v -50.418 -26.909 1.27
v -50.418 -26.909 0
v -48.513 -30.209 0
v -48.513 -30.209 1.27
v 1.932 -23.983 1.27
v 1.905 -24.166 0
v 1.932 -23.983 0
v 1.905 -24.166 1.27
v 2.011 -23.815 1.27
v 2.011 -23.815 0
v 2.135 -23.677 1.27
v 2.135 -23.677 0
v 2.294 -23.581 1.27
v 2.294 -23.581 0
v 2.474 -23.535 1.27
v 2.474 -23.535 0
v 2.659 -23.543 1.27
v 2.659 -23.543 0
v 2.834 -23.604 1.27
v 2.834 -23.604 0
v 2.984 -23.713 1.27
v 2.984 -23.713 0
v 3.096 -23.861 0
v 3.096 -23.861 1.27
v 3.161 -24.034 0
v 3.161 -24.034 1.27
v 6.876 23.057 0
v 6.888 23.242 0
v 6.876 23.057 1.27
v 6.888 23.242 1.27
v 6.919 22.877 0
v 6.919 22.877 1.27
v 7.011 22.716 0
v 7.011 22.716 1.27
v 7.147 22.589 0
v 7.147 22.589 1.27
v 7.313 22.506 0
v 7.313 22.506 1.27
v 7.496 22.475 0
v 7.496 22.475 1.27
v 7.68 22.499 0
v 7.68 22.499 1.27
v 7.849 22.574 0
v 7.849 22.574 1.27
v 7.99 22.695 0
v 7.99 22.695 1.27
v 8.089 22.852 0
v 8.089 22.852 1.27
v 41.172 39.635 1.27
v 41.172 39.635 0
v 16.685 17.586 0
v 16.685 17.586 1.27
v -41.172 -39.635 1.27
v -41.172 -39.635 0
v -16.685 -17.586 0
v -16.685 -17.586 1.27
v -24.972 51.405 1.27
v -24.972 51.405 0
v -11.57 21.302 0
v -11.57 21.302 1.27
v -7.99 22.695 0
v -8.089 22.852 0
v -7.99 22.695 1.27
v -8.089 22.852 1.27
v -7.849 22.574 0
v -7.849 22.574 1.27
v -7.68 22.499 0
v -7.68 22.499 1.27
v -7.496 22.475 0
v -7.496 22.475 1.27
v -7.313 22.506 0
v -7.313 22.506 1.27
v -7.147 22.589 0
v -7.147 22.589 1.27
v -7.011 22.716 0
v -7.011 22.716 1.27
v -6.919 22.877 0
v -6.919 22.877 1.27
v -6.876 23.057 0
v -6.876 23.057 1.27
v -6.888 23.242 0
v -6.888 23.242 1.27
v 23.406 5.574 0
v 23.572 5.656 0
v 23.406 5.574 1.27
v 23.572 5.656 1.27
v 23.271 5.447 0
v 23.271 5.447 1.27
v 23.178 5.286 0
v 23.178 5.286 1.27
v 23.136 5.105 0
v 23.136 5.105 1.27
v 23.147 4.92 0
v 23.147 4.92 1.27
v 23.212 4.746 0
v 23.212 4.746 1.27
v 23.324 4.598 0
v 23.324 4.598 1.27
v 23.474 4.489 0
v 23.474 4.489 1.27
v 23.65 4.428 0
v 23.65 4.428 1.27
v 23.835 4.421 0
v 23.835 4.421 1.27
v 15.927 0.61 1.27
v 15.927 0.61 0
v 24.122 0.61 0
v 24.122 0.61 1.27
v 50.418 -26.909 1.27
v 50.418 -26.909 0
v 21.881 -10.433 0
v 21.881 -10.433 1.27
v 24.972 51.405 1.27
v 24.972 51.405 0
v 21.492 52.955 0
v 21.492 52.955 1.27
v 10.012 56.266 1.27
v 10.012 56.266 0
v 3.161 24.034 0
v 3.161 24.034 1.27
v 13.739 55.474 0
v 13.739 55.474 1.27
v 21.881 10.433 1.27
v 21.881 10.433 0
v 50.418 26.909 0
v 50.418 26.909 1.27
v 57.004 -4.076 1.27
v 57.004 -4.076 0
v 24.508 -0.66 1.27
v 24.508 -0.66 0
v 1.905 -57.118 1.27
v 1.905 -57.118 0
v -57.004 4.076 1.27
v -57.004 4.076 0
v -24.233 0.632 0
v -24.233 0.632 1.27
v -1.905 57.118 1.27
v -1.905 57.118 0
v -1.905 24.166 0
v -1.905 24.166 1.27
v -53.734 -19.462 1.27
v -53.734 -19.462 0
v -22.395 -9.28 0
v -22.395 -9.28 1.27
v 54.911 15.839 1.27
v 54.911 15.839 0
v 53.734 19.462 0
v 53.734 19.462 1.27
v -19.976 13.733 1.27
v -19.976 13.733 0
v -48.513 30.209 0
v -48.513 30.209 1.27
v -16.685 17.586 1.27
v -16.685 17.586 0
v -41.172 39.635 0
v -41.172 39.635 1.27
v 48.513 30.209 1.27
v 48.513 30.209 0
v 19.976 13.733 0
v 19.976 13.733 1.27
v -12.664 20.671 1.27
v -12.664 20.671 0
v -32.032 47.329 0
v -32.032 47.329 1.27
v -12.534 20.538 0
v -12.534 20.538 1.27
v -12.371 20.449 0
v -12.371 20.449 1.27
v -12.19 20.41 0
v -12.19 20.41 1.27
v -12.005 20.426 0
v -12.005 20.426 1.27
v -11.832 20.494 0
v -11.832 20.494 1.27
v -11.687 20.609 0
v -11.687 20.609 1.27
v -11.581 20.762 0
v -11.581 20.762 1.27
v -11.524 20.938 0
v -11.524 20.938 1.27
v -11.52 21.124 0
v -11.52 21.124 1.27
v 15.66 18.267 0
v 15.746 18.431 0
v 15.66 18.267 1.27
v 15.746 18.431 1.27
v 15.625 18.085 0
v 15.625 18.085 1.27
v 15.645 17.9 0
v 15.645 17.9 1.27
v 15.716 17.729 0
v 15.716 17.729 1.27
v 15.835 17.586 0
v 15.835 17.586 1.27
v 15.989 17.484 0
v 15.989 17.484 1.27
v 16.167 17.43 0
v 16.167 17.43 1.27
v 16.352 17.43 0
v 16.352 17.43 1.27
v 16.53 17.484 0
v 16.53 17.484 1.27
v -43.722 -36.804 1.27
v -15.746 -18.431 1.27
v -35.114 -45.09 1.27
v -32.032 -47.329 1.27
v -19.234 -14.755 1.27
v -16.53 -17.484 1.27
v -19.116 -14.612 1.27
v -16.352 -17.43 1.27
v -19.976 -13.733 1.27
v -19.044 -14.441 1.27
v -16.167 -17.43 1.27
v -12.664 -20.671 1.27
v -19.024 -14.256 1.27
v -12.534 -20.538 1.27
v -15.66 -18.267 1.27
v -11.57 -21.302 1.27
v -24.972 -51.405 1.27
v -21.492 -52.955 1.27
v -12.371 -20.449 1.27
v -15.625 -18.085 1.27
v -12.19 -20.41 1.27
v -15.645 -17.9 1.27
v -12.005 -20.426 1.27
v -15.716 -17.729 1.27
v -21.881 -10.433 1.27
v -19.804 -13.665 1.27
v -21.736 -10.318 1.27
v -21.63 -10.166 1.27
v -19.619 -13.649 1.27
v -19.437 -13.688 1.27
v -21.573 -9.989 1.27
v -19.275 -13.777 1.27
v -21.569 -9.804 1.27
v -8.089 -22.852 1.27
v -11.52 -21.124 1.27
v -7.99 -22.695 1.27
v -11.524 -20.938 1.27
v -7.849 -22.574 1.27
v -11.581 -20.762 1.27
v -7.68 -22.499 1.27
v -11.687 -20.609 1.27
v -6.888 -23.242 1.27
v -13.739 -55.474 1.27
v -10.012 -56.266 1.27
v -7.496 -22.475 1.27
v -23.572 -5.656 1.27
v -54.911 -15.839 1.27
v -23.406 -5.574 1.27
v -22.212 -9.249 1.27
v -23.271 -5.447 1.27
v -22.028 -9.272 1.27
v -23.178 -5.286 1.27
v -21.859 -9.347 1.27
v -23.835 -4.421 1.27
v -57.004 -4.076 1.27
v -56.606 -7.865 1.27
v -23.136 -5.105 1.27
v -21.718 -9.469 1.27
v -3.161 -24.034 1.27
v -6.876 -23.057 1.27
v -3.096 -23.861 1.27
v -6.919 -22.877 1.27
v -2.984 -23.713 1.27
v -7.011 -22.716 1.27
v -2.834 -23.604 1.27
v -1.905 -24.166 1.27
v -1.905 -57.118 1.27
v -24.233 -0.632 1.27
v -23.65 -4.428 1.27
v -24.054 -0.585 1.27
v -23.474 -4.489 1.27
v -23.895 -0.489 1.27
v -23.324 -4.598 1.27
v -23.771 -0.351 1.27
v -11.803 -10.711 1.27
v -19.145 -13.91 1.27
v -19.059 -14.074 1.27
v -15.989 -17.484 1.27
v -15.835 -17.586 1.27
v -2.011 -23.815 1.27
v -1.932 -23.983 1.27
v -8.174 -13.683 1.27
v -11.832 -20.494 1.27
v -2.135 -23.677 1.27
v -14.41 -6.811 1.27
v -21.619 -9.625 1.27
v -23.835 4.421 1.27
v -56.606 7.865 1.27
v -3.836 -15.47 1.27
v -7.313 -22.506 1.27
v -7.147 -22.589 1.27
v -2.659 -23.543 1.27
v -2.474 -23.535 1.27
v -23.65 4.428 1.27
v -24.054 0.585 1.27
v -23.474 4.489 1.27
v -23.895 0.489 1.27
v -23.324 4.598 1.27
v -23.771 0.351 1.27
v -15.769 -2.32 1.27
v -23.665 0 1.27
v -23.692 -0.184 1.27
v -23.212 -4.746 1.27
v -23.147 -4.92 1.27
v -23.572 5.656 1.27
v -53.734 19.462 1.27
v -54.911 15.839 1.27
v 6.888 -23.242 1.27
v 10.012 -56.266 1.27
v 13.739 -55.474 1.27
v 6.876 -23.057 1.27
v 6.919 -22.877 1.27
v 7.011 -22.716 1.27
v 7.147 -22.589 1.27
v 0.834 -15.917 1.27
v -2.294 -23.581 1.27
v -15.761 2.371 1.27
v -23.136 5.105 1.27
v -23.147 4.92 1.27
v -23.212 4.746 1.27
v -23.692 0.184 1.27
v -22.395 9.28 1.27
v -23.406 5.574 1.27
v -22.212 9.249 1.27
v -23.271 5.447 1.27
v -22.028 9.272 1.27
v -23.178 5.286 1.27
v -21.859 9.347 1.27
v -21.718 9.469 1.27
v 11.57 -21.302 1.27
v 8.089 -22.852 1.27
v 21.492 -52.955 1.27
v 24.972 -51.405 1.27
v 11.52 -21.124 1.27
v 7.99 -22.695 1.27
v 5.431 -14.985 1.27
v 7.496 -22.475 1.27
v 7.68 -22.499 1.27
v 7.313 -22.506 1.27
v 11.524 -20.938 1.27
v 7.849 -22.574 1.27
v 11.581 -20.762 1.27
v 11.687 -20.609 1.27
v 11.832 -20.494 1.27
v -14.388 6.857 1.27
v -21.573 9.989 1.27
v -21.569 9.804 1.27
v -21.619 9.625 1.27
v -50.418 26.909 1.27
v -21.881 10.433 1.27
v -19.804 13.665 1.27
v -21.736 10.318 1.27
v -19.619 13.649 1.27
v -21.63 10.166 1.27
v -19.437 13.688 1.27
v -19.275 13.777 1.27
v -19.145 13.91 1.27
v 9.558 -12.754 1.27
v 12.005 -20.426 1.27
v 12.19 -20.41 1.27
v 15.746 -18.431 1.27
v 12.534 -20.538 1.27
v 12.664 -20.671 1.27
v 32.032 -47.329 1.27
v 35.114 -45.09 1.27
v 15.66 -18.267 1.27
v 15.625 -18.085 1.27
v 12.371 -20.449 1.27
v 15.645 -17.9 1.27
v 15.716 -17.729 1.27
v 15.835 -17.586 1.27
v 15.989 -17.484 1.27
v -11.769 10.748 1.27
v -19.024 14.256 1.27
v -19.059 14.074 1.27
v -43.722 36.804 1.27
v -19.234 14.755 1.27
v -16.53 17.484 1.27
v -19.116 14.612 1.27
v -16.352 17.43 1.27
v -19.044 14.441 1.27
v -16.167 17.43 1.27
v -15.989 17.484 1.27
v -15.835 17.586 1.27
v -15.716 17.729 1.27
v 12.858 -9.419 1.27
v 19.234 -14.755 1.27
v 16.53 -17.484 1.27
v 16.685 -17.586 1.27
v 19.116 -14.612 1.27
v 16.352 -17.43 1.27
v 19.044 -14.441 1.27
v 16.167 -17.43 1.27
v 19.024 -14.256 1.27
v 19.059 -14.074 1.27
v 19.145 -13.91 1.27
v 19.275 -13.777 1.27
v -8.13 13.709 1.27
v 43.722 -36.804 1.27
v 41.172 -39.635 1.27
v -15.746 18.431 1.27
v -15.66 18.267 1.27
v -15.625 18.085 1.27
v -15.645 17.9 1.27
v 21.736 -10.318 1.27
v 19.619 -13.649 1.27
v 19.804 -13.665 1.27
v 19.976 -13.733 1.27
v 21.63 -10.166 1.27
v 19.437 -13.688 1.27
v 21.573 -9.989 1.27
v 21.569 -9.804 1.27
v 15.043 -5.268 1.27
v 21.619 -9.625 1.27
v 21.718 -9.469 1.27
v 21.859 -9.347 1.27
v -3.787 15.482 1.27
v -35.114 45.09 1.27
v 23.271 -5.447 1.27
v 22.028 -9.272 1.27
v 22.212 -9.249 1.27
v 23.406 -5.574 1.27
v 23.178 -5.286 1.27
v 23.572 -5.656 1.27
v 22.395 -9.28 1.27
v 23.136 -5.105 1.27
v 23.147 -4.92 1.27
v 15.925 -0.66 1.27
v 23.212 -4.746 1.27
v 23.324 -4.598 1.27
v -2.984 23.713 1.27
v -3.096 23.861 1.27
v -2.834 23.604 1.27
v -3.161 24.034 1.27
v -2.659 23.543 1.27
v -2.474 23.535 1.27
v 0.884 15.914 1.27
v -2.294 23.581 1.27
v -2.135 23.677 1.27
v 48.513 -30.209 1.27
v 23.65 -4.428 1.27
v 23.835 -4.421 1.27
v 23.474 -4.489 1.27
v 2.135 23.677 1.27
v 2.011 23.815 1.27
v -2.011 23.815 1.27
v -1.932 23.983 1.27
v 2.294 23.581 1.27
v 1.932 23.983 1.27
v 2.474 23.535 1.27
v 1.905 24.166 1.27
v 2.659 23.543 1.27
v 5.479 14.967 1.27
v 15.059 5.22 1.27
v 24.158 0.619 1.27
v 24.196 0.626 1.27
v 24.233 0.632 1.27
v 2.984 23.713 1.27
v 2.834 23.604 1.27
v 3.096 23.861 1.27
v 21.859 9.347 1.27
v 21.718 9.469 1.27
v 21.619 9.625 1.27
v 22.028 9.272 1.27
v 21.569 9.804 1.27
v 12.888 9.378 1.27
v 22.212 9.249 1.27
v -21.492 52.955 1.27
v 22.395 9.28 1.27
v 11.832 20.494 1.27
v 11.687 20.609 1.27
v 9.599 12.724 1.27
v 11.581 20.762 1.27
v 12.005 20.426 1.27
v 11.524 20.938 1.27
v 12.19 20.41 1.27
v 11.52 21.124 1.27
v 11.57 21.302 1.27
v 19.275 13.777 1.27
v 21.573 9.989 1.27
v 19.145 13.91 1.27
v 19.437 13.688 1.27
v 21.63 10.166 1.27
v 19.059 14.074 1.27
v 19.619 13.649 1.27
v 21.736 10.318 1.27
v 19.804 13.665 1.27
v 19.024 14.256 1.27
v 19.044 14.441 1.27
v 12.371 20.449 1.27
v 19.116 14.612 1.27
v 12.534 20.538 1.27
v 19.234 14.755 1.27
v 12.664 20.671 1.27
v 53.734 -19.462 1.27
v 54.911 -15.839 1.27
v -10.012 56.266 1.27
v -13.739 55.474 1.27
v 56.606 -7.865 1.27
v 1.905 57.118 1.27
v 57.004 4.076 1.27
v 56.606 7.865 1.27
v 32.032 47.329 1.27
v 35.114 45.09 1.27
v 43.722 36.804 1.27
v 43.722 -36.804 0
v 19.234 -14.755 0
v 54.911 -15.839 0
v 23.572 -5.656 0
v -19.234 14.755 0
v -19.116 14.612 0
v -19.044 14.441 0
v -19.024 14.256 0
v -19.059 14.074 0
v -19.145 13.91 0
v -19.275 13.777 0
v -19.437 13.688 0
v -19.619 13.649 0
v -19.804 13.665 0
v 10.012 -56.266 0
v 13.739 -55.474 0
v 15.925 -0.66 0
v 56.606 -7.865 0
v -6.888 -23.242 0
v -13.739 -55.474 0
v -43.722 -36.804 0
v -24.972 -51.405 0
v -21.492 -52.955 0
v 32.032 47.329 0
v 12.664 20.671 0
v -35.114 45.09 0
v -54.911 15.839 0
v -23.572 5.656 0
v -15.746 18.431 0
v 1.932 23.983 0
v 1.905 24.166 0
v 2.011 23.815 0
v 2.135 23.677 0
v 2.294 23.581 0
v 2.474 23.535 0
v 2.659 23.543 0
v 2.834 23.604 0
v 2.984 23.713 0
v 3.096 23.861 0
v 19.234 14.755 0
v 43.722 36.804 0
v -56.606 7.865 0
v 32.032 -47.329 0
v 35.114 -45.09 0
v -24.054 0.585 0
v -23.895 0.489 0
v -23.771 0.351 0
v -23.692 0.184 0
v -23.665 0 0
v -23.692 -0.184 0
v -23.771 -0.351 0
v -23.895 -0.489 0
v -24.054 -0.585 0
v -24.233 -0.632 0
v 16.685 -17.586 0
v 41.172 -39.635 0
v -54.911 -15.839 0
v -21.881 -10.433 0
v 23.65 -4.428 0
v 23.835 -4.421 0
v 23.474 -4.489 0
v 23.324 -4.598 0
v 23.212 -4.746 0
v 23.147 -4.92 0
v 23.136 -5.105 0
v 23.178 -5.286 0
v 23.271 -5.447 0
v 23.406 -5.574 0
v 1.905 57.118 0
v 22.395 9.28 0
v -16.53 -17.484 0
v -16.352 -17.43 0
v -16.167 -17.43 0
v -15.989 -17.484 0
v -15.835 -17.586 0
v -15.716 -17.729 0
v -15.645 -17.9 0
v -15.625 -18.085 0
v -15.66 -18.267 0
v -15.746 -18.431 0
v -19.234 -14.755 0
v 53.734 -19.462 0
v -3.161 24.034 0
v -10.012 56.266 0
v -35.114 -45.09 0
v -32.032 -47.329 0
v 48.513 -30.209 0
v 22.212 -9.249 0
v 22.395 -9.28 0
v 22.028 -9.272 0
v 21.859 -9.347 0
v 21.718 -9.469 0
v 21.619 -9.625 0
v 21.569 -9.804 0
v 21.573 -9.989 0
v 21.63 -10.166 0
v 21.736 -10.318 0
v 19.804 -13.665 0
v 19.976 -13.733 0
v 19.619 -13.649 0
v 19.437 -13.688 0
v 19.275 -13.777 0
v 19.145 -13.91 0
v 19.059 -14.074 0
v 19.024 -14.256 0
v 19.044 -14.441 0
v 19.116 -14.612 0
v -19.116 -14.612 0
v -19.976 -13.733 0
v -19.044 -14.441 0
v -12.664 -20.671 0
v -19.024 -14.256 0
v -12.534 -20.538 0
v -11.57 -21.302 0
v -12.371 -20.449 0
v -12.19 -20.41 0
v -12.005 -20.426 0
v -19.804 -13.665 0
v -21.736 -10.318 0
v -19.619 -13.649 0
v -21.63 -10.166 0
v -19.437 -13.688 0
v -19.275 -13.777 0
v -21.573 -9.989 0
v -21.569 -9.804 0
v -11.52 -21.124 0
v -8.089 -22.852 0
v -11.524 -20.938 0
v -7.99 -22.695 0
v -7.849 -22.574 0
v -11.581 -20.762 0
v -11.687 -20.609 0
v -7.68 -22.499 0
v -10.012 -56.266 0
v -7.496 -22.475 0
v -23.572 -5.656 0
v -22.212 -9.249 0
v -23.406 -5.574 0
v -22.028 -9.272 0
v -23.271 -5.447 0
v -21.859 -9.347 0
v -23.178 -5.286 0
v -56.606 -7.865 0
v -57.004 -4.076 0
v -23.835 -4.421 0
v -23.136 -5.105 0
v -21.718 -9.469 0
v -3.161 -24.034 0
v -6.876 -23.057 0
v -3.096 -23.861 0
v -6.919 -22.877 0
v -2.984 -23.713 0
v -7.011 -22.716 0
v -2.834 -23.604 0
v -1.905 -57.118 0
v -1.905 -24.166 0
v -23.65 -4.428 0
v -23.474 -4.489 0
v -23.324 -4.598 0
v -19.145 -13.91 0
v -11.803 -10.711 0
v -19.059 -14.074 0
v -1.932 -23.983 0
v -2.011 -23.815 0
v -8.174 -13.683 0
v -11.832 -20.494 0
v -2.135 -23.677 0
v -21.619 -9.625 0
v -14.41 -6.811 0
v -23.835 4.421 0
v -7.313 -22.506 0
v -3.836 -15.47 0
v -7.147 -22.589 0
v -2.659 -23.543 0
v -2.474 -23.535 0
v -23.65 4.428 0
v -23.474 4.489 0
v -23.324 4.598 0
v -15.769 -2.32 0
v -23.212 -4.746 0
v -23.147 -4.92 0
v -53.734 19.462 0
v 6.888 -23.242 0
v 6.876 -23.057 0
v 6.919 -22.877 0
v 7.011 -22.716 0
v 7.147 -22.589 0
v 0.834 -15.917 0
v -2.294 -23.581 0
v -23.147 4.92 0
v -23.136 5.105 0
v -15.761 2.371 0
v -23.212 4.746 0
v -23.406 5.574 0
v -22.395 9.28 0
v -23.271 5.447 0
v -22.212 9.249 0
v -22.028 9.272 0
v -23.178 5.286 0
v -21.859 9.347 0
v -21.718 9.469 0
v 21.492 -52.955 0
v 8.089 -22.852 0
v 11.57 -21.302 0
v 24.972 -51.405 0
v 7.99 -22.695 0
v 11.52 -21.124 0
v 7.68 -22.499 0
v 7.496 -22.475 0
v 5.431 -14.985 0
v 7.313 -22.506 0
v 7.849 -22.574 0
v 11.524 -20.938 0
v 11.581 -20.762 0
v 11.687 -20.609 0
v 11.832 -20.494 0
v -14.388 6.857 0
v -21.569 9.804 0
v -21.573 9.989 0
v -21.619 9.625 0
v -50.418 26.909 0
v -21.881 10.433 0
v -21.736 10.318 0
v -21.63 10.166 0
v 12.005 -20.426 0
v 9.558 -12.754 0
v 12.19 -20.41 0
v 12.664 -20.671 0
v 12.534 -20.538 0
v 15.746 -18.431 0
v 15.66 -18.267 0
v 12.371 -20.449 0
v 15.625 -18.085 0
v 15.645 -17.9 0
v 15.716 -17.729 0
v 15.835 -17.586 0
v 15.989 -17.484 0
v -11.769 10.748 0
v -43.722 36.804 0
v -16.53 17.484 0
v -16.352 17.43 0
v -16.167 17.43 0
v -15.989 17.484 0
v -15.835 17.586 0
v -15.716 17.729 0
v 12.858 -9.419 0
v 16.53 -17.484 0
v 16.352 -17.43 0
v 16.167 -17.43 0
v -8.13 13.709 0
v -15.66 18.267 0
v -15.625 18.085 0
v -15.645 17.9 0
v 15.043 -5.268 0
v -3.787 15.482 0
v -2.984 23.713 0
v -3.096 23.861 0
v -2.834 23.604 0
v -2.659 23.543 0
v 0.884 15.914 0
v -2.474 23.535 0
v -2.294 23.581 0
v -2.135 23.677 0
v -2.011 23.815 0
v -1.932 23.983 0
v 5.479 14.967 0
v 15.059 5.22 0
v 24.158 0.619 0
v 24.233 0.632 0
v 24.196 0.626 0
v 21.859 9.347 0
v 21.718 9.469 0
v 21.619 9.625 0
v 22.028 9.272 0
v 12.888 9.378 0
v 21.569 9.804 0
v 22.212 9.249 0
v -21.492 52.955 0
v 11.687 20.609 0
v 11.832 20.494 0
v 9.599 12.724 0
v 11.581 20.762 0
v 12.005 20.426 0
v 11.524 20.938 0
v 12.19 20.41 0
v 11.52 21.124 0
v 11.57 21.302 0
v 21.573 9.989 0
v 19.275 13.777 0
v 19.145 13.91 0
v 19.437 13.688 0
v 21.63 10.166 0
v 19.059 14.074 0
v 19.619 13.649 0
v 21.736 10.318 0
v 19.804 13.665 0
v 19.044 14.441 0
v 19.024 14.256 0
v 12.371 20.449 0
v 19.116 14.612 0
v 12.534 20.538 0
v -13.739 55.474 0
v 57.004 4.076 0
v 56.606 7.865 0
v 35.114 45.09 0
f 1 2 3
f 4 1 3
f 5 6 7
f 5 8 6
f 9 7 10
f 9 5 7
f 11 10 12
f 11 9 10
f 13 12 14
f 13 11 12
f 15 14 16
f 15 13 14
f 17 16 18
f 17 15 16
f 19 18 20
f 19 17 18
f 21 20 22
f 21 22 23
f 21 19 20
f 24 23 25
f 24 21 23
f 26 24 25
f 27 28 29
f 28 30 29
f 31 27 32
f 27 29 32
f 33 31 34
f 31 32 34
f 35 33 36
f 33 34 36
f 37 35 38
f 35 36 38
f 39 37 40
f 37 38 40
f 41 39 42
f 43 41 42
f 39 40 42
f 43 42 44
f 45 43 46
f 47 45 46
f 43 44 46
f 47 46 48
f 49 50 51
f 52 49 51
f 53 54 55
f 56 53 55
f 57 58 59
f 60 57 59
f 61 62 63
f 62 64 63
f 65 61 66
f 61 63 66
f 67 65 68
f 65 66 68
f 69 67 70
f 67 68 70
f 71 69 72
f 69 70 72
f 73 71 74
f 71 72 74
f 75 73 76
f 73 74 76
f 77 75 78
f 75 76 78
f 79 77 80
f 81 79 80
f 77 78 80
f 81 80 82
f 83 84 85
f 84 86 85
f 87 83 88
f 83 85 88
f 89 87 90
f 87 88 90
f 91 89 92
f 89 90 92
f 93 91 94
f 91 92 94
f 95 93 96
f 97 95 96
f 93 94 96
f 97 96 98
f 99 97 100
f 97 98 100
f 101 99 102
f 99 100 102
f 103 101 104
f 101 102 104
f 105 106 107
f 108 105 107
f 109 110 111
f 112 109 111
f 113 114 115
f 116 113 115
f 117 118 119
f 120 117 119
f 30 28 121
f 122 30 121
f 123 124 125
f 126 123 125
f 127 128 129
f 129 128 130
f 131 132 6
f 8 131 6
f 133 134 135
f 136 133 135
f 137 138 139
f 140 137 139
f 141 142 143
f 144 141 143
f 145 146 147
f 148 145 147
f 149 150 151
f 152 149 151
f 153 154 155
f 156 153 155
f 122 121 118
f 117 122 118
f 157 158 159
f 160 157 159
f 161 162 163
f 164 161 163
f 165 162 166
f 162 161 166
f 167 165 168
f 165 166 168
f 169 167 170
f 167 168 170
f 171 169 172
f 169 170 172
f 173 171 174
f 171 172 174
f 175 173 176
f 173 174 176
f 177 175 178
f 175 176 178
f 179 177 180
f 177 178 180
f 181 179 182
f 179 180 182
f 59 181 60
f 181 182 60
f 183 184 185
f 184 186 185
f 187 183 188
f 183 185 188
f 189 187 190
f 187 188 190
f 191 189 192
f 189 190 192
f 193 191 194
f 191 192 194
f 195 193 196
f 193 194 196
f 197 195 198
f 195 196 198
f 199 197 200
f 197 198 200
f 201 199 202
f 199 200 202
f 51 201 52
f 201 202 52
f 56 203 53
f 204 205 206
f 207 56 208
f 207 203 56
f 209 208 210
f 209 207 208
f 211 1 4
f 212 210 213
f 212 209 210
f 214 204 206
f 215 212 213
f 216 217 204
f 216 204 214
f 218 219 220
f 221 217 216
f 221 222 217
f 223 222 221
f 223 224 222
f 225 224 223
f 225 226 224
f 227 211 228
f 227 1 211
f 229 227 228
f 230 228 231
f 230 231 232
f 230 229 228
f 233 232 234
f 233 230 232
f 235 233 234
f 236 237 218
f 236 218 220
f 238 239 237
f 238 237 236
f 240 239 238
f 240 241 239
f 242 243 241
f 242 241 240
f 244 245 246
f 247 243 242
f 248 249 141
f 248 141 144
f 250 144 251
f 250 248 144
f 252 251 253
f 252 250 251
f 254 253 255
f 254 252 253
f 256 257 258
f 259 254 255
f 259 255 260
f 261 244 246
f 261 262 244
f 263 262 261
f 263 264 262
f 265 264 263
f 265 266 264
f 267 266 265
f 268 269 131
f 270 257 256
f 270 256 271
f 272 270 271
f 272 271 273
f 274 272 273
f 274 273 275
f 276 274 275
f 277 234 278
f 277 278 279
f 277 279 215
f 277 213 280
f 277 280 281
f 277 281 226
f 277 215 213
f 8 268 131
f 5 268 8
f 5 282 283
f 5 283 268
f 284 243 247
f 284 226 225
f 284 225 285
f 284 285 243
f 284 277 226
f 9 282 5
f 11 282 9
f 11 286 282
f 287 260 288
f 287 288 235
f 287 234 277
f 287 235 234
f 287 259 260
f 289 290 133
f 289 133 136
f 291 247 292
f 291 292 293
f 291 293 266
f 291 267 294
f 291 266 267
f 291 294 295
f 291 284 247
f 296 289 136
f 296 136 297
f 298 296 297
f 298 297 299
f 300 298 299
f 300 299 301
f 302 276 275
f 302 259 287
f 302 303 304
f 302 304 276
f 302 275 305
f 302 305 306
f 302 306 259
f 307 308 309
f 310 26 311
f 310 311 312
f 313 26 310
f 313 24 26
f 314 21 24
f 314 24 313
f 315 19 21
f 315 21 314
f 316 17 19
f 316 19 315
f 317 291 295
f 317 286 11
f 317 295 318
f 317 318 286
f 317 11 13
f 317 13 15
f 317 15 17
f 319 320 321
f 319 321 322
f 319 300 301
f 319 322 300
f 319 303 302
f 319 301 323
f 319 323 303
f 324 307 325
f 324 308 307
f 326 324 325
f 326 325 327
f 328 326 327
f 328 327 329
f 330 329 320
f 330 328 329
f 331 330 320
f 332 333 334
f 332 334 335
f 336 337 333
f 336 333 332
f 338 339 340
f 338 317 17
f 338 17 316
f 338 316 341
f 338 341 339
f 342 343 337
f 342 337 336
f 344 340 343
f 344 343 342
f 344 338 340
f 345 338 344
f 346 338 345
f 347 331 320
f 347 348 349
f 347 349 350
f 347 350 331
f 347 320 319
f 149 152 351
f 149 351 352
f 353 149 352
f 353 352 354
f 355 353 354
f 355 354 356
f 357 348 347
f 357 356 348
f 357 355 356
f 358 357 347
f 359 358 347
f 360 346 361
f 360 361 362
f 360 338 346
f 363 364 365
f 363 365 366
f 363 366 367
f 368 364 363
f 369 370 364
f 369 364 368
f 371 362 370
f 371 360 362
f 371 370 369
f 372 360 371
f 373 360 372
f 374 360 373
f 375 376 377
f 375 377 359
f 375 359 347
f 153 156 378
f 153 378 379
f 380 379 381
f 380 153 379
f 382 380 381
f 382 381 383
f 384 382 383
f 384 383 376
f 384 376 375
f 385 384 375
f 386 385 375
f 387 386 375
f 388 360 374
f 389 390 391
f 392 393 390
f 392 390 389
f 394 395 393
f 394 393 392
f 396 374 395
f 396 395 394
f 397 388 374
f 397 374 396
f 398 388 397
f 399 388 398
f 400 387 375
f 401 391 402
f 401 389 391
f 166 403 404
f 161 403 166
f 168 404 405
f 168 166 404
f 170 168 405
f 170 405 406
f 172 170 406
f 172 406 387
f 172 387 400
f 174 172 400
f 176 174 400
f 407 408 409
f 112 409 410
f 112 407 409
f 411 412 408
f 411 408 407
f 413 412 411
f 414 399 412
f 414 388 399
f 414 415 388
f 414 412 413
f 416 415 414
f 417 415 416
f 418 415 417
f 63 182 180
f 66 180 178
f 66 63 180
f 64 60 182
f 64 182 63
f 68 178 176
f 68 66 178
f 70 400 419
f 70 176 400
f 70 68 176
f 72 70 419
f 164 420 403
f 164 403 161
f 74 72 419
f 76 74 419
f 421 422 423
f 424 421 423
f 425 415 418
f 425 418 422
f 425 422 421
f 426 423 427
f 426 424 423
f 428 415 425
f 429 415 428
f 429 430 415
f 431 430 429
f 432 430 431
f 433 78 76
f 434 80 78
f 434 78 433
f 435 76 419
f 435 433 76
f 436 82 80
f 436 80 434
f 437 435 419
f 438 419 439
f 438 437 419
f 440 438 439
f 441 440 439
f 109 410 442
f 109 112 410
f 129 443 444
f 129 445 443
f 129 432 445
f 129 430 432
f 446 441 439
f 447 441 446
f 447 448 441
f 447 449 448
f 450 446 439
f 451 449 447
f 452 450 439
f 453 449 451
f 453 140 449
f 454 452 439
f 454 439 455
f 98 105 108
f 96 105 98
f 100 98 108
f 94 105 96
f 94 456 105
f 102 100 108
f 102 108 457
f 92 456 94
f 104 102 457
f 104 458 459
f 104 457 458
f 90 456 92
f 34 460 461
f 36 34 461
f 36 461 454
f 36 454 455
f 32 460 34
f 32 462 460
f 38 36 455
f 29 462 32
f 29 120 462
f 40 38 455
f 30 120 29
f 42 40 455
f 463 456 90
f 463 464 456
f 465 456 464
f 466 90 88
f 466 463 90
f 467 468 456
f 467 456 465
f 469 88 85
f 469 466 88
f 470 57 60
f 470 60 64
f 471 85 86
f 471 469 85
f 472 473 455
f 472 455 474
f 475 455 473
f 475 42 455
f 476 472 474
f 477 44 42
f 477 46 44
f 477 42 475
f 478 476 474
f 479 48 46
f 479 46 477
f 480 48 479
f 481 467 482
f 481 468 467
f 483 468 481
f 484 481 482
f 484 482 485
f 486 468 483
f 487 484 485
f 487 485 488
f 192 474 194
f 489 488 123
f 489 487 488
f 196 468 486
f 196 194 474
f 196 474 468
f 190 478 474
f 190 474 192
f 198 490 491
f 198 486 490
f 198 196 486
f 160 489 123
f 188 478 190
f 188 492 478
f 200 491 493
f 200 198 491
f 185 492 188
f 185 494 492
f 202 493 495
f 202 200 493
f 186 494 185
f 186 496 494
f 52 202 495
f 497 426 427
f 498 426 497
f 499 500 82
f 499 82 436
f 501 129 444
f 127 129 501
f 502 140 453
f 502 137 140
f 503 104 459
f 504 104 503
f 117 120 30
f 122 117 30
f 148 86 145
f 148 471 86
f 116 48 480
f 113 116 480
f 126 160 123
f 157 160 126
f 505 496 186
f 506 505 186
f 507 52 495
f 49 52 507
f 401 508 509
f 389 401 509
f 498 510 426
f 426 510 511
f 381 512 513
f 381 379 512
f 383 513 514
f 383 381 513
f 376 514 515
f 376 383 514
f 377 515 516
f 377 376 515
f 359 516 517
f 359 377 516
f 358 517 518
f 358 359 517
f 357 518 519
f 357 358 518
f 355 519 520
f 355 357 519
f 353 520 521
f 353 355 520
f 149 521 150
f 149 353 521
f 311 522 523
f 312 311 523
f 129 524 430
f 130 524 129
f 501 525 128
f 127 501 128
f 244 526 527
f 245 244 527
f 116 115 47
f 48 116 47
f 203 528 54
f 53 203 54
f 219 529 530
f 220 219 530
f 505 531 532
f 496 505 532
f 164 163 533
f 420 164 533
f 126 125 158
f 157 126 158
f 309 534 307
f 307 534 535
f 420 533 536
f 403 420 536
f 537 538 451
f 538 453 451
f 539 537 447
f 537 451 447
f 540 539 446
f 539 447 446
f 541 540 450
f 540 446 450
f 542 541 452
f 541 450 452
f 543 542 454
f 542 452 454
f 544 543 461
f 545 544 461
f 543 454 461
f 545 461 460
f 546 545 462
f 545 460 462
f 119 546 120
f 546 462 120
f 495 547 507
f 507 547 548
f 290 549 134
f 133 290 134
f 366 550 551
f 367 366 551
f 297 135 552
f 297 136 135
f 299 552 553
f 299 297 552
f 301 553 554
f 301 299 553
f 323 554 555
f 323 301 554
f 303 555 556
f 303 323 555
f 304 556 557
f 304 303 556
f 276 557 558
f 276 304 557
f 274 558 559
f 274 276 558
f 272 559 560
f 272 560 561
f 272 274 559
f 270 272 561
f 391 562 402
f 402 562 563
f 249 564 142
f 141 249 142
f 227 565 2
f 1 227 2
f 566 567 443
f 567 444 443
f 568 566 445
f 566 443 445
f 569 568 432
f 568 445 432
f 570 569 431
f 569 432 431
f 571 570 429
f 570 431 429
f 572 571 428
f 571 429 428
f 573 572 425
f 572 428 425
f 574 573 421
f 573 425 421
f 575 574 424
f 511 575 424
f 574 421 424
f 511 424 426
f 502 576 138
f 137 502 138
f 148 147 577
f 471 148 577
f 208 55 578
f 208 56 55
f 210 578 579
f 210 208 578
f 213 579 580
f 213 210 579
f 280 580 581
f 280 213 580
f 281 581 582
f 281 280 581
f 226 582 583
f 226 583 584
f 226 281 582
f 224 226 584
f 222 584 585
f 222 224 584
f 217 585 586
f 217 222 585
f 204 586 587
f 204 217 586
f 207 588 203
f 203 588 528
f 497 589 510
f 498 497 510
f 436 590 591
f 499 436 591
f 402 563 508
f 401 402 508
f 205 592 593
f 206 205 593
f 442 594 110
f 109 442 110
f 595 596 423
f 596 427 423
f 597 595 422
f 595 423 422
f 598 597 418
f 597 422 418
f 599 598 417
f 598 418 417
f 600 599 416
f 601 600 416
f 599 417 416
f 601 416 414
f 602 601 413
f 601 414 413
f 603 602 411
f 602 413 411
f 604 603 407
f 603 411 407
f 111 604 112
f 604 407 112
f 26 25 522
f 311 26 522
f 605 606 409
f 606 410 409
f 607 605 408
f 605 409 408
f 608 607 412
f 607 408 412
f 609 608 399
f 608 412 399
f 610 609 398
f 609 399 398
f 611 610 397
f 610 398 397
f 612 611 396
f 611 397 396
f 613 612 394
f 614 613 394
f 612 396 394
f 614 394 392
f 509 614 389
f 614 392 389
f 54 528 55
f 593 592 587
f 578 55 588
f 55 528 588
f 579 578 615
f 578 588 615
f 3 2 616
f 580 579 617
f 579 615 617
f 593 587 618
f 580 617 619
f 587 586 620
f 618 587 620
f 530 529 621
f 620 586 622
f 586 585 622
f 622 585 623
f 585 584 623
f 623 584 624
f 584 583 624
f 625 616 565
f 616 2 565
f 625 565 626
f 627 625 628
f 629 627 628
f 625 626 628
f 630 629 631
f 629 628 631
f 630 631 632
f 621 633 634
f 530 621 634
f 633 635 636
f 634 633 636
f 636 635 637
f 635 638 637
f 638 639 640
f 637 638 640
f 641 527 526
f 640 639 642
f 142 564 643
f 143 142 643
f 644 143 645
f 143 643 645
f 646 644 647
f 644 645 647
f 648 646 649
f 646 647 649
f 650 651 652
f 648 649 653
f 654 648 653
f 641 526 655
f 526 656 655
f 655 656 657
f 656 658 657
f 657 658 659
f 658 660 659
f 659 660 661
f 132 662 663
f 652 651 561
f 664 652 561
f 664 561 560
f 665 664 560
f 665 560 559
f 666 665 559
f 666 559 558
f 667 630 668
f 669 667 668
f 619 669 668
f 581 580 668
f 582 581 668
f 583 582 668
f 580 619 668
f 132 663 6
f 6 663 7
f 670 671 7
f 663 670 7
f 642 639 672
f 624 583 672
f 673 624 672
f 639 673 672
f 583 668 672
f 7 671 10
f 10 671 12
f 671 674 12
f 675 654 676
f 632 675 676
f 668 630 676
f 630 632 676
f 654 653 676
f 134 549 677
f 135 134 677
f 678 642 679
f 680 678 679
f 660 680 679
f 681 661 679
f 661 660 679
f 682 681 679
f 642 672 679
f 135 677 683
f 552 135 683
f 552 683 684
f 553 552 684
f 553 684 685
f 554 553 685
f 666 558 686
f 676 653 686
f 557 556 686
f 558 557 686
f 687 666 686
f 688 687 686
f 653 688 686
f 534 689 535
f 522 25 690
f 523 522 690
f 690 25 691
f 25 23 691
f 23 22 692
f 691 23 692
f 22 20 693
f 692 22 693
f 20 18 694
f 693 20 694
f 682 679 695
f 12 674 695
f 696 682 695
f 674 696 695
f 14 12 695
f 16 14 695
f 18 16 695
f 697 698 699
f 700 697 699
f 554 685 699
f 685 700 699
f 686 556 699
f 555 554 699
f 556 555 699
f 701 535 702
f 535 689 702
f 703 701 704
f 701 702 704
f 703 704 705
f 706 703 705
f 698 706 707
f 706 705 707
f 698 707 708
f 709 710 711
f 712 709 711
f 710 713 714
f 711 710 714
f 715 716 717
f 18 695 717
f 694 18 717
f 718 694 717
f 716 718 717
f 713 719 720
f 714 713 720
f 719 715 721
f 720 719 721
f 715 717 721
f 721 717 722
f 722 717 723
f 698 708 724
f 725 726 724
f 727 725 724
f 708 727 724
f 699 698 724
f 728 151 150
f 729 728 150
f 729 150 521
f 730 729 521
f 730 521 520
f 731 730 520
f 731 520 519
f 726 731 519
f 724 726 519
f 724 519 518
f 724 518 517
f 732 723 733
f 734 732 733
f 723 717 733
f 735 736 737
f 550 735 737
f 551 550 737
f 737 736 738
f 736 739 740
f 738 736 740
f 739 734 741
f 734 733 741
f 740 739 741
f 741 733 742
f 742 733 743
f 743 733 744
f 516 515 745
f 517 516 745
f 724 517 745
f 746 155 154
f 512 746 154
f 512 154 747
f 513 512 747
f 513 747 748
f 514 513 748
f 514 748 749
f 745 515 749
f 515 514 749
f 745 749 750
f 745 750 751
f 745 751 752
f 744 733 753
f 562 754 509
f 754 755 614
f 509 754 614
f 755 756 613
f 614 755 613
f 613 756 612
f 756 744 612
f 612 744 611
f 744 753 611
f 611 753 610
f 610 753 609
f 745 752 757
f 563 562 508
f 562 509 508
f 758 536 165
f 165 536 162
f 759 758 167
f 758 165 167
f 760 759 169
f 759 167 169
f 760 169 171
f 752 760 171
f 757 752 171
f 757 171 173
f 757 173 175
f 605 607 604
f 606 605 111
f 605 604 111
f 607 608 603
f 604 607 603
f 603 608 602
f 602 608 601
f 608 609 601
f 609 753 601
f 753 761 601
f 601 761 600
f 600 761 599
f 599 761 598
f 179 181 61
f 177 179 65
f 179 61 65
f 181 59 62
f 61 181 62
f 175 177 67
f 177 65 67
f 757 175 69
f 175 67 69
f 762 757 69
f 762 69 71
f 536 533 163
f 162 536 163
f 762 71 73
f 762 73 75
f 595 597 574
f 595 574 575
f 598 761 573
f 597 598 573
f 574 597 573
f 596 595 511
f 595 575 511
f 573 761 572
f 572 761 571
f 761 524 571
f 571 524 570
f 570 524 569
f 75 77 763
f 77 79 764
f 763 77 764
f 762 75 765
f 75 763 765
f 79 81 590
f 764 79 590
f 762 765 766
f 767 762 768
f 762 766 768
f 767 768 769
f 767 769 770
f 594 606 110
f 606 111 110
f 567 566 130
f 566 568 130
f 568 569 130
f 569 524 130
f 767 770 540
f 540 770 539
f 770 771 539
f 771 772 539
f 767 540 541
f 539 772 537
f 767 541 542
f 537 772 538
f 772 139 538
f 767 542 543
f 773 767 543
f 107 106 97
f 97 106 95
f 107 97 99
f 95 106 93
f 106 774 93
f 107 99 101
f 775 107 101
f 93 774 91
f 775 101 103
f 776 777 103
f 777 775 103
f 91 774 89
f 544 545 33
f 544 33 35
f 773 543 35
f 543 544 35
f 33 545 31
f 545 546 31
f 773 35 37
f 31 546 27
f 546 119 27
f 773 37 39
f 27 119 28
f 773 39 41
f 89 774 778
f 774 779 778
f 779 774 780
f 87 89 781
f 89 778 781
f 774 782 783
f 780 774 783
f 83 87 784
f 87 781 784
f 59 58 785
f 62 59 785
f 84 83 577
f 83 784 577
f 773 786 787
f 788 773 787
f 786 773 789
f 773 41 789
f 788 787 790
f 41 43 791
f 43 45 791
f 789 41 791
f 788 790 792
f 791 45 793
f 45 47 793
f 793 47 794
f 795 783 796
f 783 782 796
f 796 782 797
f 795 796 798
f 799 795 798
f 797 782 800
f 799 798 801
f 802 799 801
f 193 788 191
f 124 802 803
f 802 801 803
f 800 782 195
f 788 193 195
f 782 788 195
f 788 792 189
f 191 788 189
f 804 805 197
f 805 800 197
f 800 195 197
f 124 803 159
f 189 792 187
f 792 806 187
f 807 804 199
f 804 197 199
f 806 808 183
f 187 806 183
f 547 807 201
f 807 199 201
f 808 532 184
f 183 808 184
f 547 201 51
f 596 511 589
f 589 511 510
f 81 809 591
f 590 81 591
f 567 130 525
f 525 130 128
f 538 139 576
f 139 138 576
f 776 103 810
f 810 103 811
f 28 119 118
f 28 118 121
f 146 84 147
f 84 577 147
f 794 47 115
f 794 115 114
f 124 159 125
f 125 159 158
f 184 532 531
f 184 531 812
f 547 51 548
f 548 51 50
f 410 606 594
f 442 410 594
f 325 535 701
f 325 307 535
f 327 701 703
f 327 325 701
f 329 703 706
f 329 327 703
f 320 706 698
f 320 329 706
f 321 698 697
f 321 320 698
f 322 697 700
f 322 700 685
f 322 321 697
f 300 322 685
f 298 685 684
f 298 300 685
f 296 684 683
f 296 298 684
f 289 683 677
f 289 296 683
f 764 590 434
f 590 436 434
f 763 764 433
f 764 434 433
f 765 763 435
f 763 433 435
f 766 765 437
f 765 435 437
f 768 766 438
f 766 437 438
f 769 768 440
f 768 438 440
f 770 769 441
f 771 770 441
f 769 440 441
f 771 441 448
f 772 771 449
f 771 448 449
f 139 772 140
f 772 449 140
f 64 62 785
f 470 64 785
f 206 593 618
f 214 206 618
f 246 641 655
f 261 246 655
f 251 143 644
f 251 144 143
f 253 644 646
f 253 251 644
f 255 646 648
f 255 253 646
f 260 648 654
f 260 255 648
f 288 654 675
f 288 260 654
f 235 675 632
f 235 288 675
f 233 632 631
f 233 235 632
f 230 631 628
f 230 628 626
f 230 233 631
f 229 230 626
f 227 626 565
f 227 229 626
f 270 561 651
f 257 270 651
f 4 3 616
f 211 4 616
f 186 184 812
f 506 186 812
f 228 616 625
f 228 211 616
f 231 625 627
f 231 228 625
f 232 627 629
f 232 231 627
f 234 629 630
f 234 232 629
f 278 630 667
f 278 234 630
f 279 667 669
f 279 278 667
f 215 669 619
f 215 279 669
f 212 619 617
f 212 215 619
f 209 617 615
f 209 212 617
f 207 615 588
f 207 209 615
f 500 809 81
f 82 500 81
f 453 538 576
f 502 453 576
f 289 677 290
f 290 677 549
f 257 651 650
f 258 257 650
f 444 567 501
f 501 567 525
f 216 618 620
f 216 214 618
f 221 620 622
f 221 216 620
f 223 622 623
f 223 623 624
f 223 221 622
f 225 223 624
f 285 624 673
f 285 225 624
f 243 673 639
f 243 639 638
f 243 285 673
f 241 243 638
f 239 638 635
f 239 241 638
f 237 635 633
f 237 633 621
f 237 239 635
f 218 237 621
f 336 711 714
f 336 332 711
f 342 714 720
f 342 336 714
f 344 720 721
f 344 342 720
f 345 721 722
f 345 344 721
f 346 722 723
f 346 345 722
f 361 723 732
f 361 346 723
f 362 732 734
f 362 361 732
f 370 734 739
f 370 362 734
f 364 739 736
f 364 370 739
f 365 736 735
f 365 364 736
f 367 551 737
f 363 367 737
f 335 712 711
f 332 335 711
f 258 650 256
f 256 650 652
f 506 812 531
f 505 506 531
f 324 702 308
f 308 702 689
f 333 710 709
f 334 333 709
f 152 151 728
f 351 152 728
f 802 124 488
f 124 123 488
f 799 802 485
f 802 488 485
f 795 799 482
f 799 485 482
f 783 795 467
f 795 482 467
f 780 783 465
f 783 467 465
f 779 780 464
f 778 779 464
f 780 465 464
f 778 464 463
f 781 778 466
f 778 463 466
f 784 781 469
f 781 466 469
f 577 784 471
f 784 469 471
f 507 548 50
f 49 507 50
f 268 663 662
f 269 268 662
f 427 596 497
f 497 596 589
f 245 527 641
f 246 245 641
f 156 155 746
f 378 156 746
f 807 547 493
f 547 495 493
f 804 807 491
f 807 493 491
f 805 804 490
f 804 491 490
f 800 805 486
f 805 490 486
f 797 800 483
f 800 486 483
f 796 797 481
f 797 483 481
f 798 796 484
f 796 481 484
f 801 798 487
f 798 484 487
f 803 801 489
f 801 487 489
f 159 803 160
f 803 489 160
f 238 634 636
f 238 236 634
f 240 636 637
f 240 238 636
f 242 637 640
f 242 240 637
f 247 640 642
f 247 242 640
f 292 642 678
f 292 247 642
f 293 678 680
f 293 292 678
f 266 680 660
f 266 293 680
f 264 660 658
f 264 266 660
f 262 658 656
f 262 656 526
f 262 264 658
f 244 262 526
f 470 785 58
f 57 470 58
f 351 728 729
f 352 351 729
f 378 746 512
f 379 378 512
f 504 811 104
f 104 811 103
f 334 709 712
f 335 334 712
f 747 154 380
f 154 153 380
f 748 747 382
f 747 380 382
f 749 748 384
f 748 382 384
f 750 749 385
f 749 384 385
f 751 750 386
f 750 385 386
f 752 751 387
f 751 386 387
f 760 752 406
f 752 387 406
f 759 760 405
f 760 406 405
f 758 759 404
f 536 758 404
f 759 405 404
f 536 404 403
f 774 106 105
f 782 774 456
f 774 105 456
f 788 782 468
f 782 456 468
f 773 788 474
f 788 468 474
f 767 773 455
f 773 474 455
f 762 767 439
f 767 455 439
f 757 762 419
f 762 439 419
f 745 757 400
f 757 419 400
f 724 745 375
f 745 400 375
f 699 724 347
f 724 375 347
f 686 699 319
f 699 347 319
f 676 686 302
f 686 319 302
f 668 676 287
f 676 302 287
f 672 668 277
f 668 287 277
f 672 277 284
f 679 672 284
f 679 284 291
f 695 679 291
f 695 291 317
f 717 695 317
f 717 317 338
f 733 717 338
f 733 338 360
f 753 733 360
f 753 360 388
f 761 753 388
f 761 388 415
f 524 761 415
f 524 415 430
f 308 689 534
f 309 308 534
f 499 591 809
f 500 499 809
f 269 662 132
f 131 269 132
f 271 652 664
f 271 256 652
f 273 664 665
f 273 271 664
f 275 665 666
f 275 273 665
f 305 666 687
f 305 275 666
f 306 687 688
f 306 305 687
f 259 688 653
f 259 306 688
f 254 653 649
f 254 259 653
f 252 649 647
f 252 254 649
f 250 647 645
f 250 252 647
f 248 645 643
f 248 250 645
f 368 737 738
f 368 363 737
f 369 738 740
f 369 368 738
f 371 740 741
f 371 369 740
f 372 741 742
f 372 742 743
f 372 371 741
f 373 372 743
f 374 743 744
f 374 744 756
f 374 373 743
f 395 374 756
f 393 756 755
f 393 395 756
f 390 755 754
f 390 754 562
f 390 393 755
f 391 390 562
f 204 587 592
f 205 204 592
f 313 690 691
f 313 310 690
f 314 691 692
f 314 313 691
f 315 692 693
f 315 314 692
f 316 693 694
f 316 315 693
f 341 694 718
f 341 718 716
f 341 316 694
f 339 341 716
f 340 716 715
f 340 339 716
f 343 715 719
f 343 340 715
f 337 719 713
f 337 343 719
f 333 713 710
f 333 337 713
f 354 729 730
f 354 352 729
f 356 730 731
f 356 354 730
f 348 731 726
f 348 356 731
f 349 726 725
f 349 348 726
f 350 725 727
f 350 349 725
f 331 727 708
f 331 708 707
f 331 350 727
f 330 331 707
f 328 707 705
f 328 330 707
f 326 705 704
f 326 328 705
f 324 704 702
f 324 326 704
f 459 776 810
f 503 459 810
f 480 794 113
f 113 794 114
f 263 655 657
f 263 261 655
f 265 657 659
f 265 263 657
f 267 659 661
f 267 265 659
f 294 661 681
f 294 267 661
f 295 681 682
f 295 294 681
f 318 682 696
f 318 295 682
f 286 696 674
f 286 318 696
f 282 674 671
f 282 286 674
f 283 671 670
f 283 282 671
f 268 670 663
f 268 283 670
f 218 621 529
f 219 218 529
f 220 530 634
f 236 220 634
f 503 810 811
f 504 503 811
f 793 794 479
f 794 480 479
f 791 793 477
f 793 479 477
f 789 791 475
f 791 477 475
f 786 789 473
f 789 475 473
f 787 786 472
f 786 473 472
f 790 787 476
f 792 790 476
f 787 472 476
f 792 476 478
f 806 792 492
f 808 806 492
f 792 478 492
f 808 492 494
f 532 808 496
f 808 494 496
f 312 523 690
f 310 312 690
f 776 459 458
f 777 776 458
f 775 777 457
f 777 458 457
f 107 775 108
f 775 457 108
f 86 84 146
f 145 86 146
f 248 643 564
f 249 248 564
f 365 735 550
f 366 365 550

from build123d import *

# Parameters (mm, degrees)
F1_DEPTH = 1.27
F2_R     = 15.9385
F3_DEPTH = 25.4
F4_R     = 0.635
F5_R     = 0.635
F6_R     = 0.635
F7_W     = 41.0254188918
F7_H     = 1.27
F8_DEPTH = 25.4


with BuildPart() as f1:
    # F0 (on Top) → F1 (new body)
    with BuildSketch(Plane.XY):
        Polygon((1.905, 18.1248642853), (1.905, 13.1982271537), (1.3871895718, 13.1982271537), (4.1009418748, 12.6214012949), (3.6278985102, 12.8320137702), (5.6317423588, 17.3327207433), (13.7389212788, 55.4739987931), (10.01217892, 56.2661423351), align=None)
        Polygon((1.3871895718, 13.1982271537), (1.905, 13.1982271537), (1.905, 18.1248642853), (0.8806945439, 13.3058859953), align=None)
        Polygon((-1.3871895718, 13.1982271537), (1.3871895718, 13.1982271537), (0.8806945439, 13.3058859953), (1.905, 18.1248642853), (1.905, 57.1182411757), (-1.905, 57.1182411757), (-1.905, 18.1248642853), (-0.8806945439, 13.3058859953), align=None)
        Polygon((-4.1009418748, 12.6214012949), (-1.3871895718, 13.1982271537), (-1.905, 13.1982271537), (-1.905, 18.1248642853), (-10.01217892, 56.2661423351), (-13.7389212788, 55.4739987931), (-5.6317423588, 17.3327207433), (-3.6278985102, 12.8320137702), align=None)
        Polygon((-1.905, 13.1982271537), (-1.3871895718, 13.1982271537), (-0.8806945439, 13.3058859953), (-1.905, 18.1248642853), align=None)
        Polygon((4.6074369027, 12.5137424533), (4.1009418748, 12.6214012949), (6.6354633393, 11.4929596354), (6.2165459031, 11.7973209686), (9.1123505524, 15.7830541332), (24.972385771, 51.4052764695), (21.4917775774, 52.9549430796), (5.6317423588, 17.3327207433), align=None)
        Polygon((3.6278985102, 12.8320137702), (4.1009418748, 12.6214012949), (4.6074369027, 12.5137424533), (5.6317423588, 17.3327207433), align=None)
        Polygon((-6.6354633393, 11.4929596354), (-4.1009418748, 12.6214012949), (-4.6074369027, 12.5137424533), (-5.6317423588, 17.3327207433), (-21.4917775774, 52.9549430796), (-24.972385771, 51.4052764695), (-9.1123505524, 15.7830541332), (-6.2165459031, 11.7973209686), align=None)
        Polygon((-4.6074369027, 12.5137424533), (-4.1009418748, 12.6214012949), (-3.6278985102, 12.8320137702), (-5.6317423588, 17.3327207433), align=None)
        Polygon((7.1085067038, 11.2823471601), (6.6354633393, 11.4929596354), (8.8799832154, 9.8622204905), (8.5335004096, 10.2470286307), (12.194705301, 13.5435923219), (35.1144371742, 45.0898968943), (32.0320824256, 47.3293587055), (9.1123505524, 15.7830541332), align=None)
        Polygon((6.2165459031, 11.7973209686), (6.6354633393, 11.4929596354), (7.1085067038, 11.2823471601), (9.1123505524, 15.7830541332), align=None)
        Polygon((-8.8799832154, 9.8622204905), (-6.6354633393, 11.4929596354), (-7.1085067038, 11.2823471601), (-9.1123505524, 15.7830541332), (-32.0320824256, 47.3293587055), (-35.1144371742, 45.0898968943), (-12.194705301, 13.5435923219), (-8.5335004096, 10.2470286307), align=None)
        Polygon((-7.1085067038, 11.2823471601), (-6.6354633393, 11.4929596354), (-6.2165459031, 11.7973209686), (-9.1123505524, 15.7830541332), align=None)
        Polygon((9.2989006516, 9.5578591573), (8.8799832154, 9.8622204905), (10.7364052141, 7.8004549859), (10.4775, 8.248891971), (14.7440929112, 10.7122105369), (43.7218191752, 36.8038724595), (41.1724315649, 39.6352542446), (12.194705301, 13.5435923219), align=None)
        Polygon((8.5335004096, 10.2470286307), (8.8799832154, 9.8622204905), (9.2989006516, 9.5578591573), (12.194705301, 13.5435923219), align=None)
        Polygon((-10.7364052141, 7.8004549859), (-8.8799832154, 9.8622204905), (-9.2989006516, 9.5578591573), (-12.194705301, 13.5435923219), (-41.1724315649, 39.6352542446), (-43.7218191752, 36.8038724595), (-14.7440929112, 10.7122105369), (-10.4775, 8.248891971), align=None)
        Polygon((-9.2989006516, 9.5578591573), (-8.8799832154, 9.8622204905), (-8.5335004096, 10.2470286307), (-12.194705301, 13.5435923219), align=None)
        Polygon((11.0828880198, 7.4156468457), (10.7364052141, 7.8004549859), (12.1235947859, 5.3977721678), (11.9635825638, 5.8902391496), (16.6490929112, 7.4126537484), (50.4183478776, 26.9093421936), (48.5133478776, 30.208898982), (14.7440929112, 10.7122105369), align=None)
        Polygon((10.4775, 8.248891971), (10.7364052141, 7.8004549859), (11.0828880198, 7.4156468457), (14.7440929112, 10.7122105369), align=None)
        Polygon((-12.1235947859, 5.3977721678), (-10.7364052141, 7.8004549859), (-11.0828880198, 7.4156468457), (-14.7440929112, 10.7122105369), (-48.5133478776, 30.208898982), (-50.4183478776, 26.9093421936), (-16.6490929112, 7.4126537484), (-11.9635825638, 5.8902391496), align=None)
        Polygon((-11.0828880198, 7.4156468457), (-10.7364052141, 7.8004549859), (-10.4775, 8.248891971), (-14.7440929112, 10.7122105369), align=None)
        Polygon((12.3825, 4.9493351826), (12.1235947859, 5.3977721678), (12.9809250902, 2.7591808045), (12.9267991618, 3.2741546129), (17.8264476598, 3.7891284214), (54.9113528437, 15.8387445485), (53.7339980951, 19.4622698756), (16.6490929112, 7.4126537484), align=None)
        Polygon((11.9635825638, 5.8902391496), (12.1235947859, 5.3977721678), (12.3825, 4.9493351826), (16.6490929112, 7.4126537484), align=None)
        Polygon((-12.9809250902, 2.7591808045), (-12.1235947859, 5.3977721678), (-12.3825, 4.9493351826), (-16.6490929112, 7.4126537484), (-53.7339980951, 19.4622698756), (-54.9113528437, 15.8387445485), (-17.8264476598, 3.7891284214), (-12.9267991618, 3.2741546129), align=None)
        Polygon((-12.3825, 4.9493351826), (-12.1235947859, 5.3977721678), (-11.9635825638, 5.8902391496), (-16.6490929112, 7.4126537484), align=None)
        Polygon((13.1409373123, 2.2667138226), (12.9809250902, 2.7591808045), (13.2709266786, 0), (13.3250526069, 0.5149738084), (18.2247011048, 0), (57.0044681966, 4.075917764), (56.6062147516, 7.8650461853), (17.8264476598, 3.7891284214), align=None)
        Polygon((12.9267991618, 3.2741546129), (12.9809250902, 2.7591808045), (13.1409373123, 2.2667138226), (17.8264476598, 3.7891284214), align=None)
        Polygon((-13.2709266786, 0), (-12.9809250902, 2.7591808045), (-13.1409373123, 2.2667138226), (-17.8264476598, 3.7891284214), (-56.6062147516, 7.8650461853), (-57.0044681966, 4.075917764), (-18.2247011048, 0), (-13.3250526069, 0.5149738084), align=None)
        Polygon((-13.1409373123, 2.2667138226), (-12.9809250902, 2.7591808045), (-12.9267991618, 3.2741546129), (-17.8264476598, 3.7891284214), align=None)
        Polygon((13.3250526069, -0.5149738084), (13.2709266786, 0), (12.9809250902, -2.7591808045), (13.1409373123, -2.2667138226), (17.8264476598, -3.7891284214), (56.6062147516, -7.8650461853), (57.0044681966, -4.075917764), (18.2247011048, 0), align=None)
        Polygon((13.3250526069, 0.5149738084), (13.2709266786, 0), (13.3250526069, -0.5149738084), (18.2247011048, 0), align=None)
        Polygon((-12.9809250902, -2.7591808045), (-13.2709266786, 0), (-13.3250526069, -0.5149738084), (-18.2247011048, 0), (-57.0044681966, -4.075917764), (-56.6062147516, -7.8650461853), (-17.8264476598, -3.7891284214), (-13.1409373123, -2.2667138226), align=None)
        Polygon((-13.3250526069, -0.5149738084), (-13.2709266786, 0), (-13.3250526069, 0.5149738084), (-18.2247011048, 0), align=None)
        Polygon((12.9267991618, -3.2741546129), (12.9809250902, -2.7591808045), (12.1235947859, -5.3977721678), (12.3825, -4.9493351826), (16.6490929112, -7.4126537484), (53.7339980951, -19.4622698756), (54.9113528437, -15.8387445485), (17.8264476598, -3.7891284214), align=None)
        Polygon((13.1409373123, -2.2667138226), (12.9809250902, -2.7591808045), (12.9267991618, -3.2741546129), (17.8264476598, -3.7891284214), align=None)
        Polygon((-12.1235947859, -5.3977721678), (-12.9809250902, -2.7591808045), (-12.9267991618, -3.2741546129), (-17.8264476598, -3.7891284214), (-54.9113528437, -15.8387445485), (-53.7339980951, -19.4622698756), (-16.6490929112, -7.4126537484), (-12.3825, -4.9493351826), align=None)
        Polygon((-12.9267991618, -3.2741546129), (-12.9809250902, -2.7591808045), (-13.1409373123, -2.2667138226), (-17.8264476598, -3.7891284214), align=None)
        Polygon((11.9635825638, -5.8902391496), (12.1235947859, -5.3977721678), (10.7364052141, -7.8004549859), (11.0828880198, -7.4156468457), (14.7440929112, -10.7122105369), (48.5133478776, -30.208898982), (50.4183478776, -26.9093421936), (16.6490929112, -7.4126537484), align=None)
        Polygon((12.3825, -4.9493351826), (12.1235947859, -5.3977721678), (11.9635825638, -5.8902391496), (16.6490929112, -7.4126537484), align=None)
        Polygon((-10.7364052141, -7.8004549859), (-12.1235947859, -5.3977721678), (-11.9635825638, -5.8902391496), (-16.6490929112, -7.4126537484), (-50.4183478776, -26.9093421936), (-48.5133478776, -30.208898982), (-14.7440929112, -10.7122105369), (-11.0828880198, -7.4156468457), align=None)
        Polygon((-11.9635825638, -5.8902391496), (-12.1235947859, -5.3977721678), (-12.3825, -4.9493351826), (-16.6490929112, -7.4126537484), align=None)
        Polygon((10.4775, -8.248891971), (10.7364052141, -7.8004549859), (8.8799832154, -9.8622204905), (9.2989006516, -9.5578591573), (12.194705301, -13.5435923219), (41.1724315649, -39.6352542446), (43.7218191752, -36.8038724595), (14.7440929112, -10.7122105369), align=None)
        Polygon((11.0828880198, -7.4156468457), (10.7364052141, -7.8004549859), (10.4775, -8.248891971), (14.7440929112, -10.7122105369), align=None)
        Polygon((-8.8799832154, -9.8622204905), (-10.7364052141, -7.8004549859), (-10.4775, -8.248891971), (-14.7440929112, -10.7122105369), (-43.7218191752, -36.8038724595), (-41.1724315649, -39.6352542446), (-12.194705301, -13.5435923219), (-9.2989006516, -9.5578591573), align=None)
        Polygon((-10.4775, -8.248891971), (-10.7364052141, -7.8004549859), (-11.0828880198, -7.4156468457), (-14.7440929112, -10.7122105369), align=None)
        Polygon((8.5335004096, -10.2470286307), (8.8799832154, -9.8622204905), (6.6354633393, -11.4929596354), (7.1085067038, -11.2823471601), (9.1123505524, -15.7830541332), (32.0320824256, -47.3293587055), (35.1144371742, -45.0898968943), (12.194705301, -13.5435923219), align=None)
        Polygon((9.2989006516, -9.5578591573), (8.8799832154, -9.8622204905), (8.5335004096, -10.2470286307), (12.194705301, -13.5435923219), align=None)
        Polygon((-6.6354633393, -11.4929596354), (-8.8799832154, -9.8622204905), (-8.5335004096, -10.2470286307), (-12.194705301, -13.5435923219), (-35.1144371742, -45.0898968943), (-32.0320824256, -47.3293587055), (-9.1123505524, -15.7830541332), (-7.1085067038, -11.2823471601), align=None)
        Polygon((-8.5335004096, -10.2470286307), (-8.8799832154, -9.8622204905), (-9.2989006516, -9.5578591573), (-12.194705301, -13.5435923219), align=None)
        Polygon((6.2165459031, -11.7973209686), (6.6354633393, -11.4929596354), (4.1009418748, -12.6214012949), (4.6074369027, -12.5137424533), (5.6317423588, -17.3327207433), (21.4917775774, -52.9549430796), (24.972385771, -51.4052764695), (9.1123505524, -15.7830541332), align=None)
        Polygon((7.1085067038, -11.2823471601), (6.6354633393, -11.4929596354), (6.2165459031, -11.7973209686), (9.1123505524, -15.7830541332), align=None)
        Polygon((-4.1009418748, -12.6214012949), (-6.6354633393, -11.4929596354), (-6.2165459031, -11.7973209686), (-9.1123505524, -15.7830541332), (-24.972385771, -51.4052764695), (-21.4917775774, -52.9549430796), (-5.6317423588, -17.3327207433), (-4.6074369027, -12.5137424533), align=None)
        Polygon((-6.2165459031, -11.7973209686), (-6.6354633393, -11.4929596354), (-7.1085067038, -11.2823471601), (-9.1123505524, -15.7830541332), align=None)
        Polygon((3.6278985102, -12.8320137702), (4.1009418748, -12.6214012949), (1.3871895718, -13.1982271537), (1.905, -13.1982271537), (1.905, -18.1248642853), (10.01217892, -56.2661423351), (13.7389212788, -55.4739987931), (5.6317423588, -17.3327207433), align=None)
        Polygon((4.6074369027, -12.5137424533), (4.1009418748, -12.6214012949), (3.6278985102, -12.8320137702), (5.6317423588, -17.3327207433), align=None)
        Polygon((-1.3871895718, -13.1982271537), (-4.1009418748, -12.6214012949), (-3.6278985102, -12.8320137702), (-5.6317423588, -17.3327207433), (-13.7389212788, -55.4739987931), (-10.01217892, -56.2661423351), (-1.905, -18.1248642853), (-1.905, -13.1982271537), align=None)
        Polygon((-3.6278985102, -12.8320137702), (-4.1009418748, -12.6214012949), (-4.6074369027, -12.5137424533), (-5.6317423588, -17.3327207433), align=None)
        Polygon((0.8806945439, -13.3058859953), (1.3871895718, -13.1982271537), (-1.3871895718, -13.1982271537), (-0.8806945439, -13.3058859953), (-1.905, -18.1248642853), (-1.905, -57.1182411757), (1.905, -57.1182411757), (1.905, -18.1248642853), align=None)
        Polygon((1.905, -13.1982271537), (1.3871895718, -13.1982271537), (0.8806945439, -13.3058859953), (1.905, -18.1248642853), align=None)
        Polygon((-0.8806945439, -13.3058859953), (-1.3871895718, -13.1982271537), (-1.905, -13.1982271537), (-1.905, -18.1248642853), align=None)
    extrude(amount=F1_DEPTH)

    # F2 (on face) → F3 (cut)
    with BuildSketch(Plane.XY.offset(1.27)):
        Circle(F2_R)
    extrude(amount=-F3_DEPTH, mode=Mode.SUBTRACT)

    # F4
    f4_edges = [f1.edges().sort_by_distance(p)[0] for p in [
        (-12.194705, 13.543592, 0.635),
    ]]
    fillet(f4_edges, radius=F4_R)

    # F5
    f5_edges = [f1.edges().sort_by_distance(p)[0] for p in [
        (-9.112351, 15.783054, 0.635),
        (-1.905, 18.124864, 0.635),
        (1.905, 18.124864, 0.635),
        (5.631742, 17.332721, 0.635),
        (9.112351, 15.783054, 0.635),
        (12.194705, 13.543592, 0.635),
        (14.744093, 10.712211, 0.635),
        (16.649093, 7.412654, 0.635),
        (17.826448, 3.789128, 0.635),
        (18.224701, 0, 0.635),
        (17.826448, -3.789128, 0.635),
        (16.649093, -7.412654, 0.635),
        (14.744093, -10.712211, 0.635),
        (12.194705, -13.543592, 0.635),
        (9.112351, -15.783054, 0.635),
        (5.631742, -17.332721, 0.635),
        (1.905, -18.124864, 0.635),
        (-1.905, -18.124864, 0.635),
        (-5.631742, -17.332721, 0.635),
        (-9.112351, -15.783054, 0.635),
        (-12.194705, -13.543592, 0.635),
        (-14.744093, -10.712211, 0.635),
        (-16.649093, -7.412654, 0.635),
        (-17.826448, -3.789128, 0.635),
        (-18.224701, 0, 0.635),
        (-17.826448, 3.789128, 0.635),
        (-16.649093, 7.412654, 0.635),
        (-14.744093, 10.712211, 0.635),
    ]]
    fillet(f5_edges, radius=F5_R)

    # F6
    f6_edges = [f1.edges().sort_by_distance(p)[0] for p in [
        (-5.631742, 17.332721, 0.635),
    ]]
    fillet(f6_edges, radius=F6_R)

    # F7 (on face) → F8 (cut)
    with BuildSketch(Plane(origin=(0, 0, 0), x_dir=(1, 0, 0), z_dir=(0, 0, -1))):
        with Locations((33.822356775, 0.0253999566)):
            Rectangle(F7_W, F7_H)
    extrude(amount=-F8_DEPTH, mode=Mode.SUBTRACT)


solid = f1.part
